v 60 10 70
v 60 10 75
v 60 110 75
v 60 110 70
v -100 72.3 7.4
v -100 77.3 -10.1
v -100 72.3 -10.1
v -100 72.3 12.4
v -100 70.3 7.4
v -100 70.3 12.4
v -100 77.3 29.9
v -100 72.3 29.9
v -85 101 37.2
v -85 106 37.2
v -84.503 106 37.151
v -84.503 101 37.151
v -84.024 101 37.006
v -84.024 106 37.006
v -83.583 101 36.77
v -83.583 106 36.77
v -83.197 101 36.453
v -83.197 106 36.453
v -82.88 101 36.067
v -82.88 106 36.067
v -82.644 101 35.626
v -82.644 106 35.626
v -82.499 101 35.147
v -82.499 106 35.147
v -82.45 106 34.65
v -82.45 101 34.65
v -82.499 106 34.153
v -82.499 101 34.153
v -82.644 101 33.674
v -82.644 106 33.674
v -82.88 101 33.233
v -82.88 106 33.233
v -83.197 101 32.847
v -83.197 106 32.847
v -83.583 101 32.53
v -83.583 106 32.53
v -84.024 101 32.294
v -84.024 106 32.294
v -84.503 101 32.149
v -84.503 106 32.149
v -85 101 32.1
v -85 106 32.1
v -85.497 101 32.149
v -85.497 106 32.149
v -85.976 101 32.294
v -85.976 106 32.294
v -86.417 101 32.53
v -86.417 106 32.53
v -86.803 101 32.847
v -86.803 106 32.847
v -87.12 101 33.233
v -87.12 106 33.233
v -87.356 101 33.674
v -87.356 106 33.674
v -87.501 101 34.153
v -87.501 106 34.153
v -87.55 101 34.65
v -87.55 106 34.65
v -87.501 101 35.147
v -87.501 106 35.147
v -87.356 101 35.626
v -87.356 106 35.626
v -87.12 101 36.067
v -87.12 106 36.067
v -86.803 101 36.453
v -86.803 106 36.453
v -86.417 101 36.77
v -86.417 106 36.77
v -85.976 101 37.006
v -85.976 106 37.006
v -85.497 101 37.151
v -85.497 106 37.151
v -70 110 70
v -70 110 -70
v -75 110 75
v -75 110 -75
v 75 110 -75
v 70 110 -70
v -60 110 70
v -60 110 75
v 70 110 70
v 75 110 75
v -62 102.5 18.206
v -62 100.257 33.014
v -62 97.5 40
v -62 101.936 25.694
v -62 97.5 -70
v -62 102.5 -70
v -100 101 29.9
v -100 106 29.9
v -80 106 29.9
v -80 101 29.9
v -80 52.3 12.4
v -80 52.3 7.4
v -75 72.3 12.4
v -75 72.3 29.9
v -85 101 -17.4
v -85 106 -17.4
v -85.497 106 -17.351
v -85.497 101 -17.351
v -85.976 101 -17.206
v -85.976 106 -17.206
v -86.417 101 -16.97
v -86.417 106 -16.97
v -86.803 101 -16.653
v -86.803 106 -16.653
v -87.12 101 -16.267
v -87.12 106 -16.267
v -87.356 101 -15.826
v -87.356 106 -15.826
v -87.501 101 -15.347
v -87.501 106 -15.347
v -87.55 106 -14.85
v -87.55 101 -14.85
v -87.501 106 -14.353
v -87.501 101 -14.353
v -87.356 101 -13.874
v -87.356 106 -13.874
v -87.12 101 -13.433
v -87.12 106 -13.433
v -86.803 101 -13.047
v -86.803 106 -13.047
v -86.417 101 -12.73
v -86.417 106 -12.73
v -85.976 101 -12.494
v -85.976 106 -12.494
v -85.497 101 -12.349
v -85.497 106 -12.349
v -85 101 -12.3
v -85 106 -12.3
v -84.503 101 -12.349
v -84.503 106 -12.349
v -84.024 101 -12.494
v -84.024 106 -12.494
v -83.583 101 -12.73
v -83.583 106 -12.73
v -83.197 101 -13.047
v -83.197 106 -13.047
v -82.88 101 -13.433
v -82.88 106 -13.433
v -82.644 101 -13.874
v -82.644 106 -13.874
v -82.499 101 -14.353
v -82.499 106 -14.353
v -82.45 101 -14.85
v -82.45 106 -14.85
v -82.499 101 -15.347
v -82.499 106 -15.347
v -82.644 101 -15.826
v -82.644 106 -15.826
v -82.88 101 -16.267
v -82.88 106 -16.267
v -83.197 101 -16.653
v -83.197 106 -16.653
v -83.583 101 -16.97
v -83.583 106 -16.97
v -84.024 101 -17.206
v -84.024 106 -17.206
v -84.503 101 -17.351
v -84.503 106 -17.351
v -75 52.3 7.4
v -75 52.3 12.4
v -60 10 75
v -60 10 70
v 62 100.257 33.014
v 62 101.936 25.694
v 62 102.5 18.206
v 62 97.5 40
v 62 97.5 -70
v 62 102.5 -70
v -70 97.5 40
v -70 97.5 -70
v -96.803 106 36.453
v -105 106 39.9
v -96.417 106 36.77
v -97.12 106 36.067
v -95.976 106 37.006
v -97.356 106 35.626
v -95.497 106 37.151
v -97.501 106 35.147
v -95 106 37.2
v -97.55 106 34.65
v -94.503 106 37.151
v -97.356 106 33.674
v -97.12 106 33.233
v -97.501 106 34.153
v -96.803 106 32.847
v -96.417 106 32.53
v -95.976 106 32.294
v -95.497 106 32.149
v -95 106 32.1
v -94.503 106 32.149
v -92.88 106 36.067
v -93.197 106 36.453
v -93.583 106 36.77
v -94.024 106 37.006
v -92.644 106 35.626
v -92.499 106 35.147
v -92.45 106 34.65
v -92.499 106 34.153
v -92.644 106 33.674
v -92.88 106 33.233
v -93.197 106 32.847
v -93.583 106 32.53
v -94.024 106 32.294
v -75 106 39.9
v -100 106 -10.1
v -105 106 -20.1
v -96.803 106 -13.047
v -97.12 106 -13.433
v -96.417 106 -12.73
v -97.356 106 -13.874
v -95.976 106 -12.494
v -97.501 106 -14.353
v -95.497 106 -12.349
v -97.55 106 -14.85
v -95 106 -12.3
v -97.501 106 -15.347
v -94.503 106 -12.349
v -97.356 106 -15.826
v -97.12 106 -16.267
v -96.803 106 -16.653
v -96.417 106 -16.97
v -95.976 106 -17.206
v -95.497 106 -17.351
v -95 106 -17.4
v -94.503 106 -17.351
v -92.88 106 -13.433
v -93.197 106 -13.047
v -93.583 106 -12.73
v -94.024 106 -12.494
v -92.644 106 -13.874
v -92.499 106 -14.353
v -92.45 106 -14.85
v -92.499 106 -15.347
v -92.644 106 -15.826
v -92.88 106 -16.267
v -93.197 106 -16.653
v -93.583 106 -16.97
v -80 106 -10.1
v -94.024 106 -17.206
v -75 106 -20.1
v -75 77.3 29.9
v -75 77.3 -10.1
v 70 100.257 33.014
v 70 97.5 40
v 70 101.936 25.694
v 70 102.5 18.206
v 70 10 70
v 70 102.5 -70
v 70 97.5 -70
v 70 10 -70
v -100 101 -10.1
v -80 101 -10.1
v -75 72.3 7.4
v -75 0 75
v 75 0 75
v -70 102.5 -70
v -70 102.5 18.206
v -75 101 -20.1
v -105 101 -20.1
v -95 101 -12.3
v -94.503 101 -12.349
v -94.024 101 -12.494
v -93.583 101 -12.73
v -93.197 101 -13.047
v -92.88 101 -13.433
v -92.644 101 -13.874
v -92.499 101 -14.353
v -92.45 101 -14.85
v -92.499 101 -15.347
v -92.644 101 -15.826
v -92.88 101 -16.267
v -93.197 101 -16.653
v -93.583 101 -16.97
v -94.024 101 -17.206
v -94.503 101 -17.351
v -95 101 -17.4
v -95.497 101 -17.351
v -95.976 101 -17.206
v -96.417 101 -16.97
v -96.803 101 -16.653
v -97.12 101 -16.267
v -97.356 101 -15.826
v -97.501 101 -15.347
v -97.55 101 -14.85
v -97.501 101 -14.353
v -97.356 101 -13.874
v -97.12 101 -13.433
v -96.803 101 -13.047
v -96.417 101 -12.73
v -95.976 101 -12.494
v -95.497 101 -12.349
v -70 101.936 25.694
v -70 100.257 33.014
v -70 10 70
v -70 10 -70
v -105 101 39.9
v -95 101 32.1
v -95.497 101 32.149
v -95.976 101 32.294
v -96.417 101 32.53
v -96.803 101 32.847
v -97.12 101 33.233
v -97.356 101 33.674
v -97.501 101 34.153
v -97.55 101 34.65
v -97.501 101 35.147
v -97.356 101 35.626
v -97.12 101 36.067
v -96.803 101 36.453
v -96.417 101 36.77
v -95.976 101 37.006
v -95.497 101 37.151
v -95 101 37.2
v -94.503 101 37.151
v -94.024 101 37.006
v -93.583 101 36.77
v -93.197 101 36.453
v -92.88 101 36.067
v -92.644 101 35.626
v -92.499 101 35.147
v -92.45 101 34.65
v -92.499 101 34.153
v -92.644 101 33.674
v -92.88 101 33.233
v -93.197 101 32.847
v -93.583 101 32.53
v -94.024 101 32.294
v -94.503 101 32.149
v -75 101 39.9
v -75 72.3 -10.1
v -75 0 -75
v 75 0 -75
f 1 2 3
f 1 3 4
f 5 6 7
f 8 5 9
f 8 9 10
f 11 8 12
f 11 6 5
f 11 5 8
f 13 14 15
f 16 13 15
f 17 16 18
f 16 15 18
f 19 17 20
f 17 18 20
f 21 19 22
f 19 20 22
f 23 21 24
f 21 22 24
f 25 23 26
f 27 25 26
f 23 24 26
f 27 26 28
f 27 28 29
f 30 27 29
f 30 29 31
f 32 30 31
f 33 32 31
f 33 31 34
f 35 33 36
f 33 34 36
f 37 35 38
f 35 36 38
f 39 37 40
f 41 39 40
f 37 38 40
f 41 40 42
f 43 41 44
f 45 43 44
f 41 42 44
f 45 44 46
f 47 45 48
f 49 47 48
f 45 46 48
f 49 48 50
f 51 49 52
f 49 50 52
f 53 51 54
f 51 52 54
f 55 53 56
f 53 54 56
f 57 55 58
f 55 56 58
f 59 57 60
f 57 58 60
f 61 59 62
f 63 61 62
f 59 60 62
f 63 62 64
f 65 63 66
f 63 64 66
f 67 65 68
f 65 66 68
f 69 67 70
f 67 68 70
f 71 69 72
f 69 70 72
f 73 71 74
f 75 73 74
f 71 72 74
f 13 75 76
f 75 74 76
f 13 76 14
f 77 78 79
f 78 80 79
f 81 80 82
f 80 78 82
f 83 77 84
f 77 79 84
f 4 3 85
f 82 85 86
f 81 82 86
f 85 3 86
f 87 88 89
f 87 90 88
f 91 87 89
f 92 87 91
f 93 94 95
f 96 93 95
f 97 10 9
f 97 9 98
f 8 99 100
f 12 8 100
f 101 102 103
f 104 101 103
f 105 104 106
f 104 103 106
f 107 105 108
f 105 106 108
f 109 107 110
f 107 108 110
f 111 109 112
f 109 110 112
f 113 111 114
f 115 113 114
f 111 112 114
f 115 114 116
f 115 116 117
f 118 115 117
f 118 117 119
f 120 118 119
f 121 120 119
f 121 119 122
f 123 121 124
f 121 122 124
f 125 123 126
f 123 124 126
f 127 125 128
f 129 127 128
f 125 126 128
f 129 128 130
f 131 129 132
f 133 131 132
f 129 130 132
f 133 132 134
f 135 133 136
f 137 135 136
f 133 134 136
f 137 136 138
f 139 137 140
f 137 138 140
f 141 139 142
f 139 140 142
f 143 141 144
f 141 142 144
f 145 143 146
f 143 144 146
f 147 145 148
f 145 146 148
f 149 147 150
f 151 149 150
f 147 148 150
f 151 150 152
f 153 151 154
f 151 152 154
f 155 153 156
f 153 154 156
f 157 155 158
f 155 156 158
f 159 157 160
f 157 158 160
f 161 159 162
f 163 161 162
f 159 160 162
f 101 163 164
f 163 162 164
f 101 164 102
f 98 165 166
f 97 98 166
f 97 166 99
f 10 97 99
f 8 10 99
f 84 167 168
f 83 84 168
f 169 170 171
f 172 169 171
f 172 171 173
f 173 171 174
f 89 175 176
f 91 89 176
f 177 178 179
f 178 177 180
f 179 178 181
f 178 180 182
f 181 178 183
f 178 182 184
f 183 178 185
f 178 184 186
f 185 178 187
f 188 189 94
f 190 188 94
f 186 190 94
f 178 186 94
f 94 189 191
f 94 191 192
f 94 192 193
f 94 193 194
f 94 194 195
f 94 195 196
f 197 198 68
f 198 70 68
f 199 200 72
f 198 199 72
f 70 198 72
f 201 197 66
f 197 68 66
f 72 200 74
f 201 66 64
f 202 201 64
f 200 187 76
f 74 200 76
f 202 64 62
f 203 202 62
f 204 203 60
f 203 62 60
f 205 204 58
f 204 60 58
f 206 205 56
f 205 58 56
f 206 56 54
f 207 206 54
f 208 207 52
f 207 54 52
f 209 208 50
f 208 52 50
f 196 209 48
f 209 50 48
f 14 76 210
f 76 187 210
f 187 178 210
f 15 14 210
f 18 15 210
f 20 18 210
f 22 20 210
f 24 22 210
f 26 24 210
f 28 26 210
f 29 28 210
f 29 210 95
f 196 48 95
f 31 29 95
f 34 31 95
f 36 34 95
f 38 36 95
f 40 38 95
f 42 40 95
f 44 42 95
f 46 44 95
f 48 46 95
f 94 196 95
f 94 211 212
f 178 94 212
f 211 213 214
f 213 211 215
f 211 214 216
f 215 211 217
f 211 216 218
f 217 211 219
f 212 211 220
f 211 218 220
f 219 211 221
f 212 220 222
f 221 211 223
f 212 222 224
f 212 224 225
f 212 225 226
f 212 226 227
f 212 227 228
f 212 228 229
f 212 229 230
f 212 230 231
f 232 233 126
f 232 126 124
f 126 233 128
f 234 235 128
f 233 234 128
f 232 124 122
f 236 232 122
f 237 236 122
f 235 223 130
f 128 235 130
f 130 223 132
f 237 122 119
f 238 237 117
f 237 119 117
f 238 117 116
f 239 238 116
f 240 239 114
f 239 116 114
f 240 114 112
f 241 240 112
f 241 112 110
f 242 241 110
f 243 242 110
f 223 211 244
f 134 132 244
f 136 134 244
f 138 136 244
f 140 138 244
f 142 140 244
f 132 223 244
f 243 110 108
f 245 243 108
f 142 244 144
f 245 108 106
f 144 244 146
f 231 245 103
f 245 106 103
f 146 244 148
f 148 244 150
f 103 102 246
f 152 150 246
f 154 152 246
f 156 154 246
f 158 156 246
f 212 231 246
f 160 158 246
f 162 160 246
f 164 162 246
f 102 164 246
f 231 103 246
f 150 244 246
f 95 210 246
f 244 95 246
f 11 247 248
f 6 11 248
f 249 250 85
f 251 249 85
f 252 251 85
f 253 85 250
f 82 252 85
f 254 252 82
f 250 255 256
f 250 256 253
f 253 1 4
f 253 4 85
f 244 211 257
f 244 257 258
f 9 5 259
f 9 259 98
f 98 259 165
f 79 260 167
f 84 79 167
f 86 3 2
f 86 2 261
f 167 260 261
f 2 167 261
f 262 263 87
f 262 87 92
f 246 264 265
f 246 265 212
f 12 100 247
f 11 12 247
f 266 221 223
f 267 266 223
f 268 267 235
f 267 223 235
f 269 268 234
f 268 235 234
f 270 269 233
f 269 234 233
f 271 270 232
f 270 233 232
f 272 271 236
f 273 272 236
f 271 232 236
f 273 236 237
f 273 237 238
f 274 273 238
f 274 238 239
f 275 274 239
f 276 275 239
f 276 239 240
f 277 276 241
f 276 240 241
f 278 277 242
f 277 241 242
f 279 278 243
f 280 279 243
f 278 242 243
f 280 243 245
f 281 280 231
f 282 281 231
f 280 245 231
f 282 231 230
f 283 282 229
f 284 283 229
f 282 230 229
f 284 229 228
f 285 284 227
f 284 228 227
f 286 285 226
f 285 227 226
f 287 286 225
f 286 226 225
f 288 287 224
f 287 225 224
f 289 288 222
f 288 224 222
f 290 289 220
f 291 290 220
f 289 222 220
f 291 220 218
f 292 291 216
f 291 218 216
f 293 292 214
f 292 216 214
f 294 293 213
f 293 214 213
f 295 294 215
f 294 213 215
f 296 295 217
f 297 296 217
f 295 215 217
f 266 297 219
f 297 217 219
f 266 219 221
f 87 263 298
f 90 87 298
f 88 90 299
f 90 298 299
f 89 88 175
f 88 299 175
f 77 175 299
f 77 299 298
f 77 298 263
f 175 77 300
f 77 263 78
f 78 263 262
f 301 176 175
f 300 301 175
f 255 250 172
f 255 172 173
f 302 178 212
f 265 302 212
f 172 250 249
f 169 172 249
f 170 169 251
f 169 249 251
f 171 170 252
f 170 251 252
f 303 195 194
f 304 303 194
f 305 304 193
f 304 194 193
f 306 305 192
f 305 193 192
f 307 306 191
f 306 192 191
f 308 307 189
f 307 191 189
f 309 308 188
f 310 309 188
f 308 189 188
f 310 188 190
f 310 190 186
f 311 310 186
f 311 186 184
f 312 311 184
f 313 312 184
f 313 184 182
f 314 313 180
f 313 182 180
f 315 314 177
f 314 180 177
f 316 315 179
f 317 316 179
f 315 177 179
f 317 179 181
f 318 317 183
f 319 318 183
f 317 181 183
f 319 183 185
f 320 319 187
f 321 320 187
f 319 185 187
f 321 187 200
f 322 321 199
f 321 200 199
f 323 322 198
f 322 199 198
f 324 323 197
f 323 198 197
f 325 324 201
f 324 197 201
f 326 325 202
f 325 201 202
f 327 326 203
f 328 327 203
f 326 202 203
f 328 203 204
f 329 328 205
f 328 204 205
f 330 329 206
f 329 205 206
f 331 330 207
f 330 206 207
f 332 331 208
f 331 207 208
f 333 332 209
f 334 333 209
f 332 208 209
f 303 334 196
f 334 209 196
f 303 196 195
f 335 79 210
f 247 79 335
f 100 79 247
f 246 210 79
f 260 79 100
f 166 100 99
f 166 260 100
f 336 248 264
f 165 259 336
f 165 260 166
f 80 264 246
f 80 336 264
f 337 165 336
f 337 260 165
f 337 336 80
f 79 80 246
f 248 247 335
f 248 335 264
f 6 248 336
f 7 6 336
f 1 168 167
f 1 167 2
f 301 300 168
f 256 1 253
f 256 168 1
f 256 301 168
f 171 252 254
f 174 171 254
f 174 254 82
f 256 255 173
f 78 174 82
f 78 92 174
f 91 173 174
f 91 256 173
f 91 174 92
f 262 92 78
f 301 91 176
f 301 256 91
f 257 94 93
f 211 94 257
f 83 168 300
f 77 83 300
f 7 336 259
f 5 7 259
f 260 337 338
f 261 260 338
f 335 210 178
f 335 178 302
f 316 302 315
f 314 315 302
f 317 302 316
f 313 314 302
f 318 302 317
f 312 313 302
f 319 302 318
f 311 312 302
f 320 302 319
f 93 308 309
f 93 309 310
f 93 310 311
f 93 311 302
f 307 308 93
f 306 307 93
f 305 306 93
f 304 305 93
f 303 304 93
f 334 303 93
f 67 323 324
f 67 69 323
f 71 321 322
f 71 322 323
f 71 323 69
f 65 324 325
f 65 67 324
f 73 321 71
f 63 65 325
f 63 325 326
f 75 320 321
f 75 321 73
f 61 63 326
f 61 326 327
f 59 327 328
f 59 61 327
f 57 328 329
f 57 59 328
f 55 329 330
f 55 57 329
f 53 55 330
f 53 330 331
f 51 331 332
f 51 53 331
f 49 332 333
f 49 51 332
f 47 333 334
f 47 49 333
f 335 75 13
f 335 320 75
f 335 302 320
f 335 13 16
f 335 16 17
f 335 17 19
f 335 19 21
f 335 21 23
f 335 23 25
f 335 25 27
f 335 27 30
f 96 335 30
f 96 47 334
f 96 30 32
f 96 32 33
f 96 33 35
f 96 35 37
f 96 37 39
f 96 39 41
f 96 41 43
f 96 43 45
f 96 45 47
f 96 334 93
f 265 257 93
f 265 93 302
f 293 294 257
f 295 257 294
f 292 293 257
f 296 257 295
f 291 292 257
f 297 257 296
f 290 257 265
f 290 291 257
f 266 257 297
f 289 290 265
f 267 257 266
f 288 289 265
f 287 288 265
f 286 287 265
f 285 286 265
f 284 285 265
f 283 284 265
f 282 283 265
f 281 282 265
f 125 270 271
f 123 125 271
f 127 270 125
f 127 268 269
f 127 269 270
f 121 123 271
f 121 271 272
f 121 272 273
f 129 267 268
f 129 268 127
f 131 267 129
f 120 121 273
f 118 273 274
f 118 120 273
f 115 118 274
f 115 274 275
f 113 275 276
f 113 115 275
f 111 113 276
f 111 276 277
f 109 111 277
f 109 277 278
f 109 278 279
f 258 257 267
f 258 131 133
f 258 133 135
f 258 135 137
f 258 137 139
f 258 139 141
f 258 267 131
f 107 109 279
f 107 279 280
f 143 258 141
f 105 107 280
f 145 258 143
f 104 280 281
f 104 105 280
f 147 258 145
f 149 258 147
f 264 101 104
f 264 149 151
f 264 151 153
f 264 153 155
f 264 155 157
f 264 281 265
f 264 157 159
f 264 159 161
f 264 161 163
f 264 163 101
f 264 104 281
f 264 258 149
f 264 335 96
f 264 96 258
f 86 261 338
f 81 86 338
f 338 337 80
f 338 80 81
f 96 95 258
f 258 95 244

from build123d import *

# Parameters (mm, degrees)
SKETCH1_W           = 150
SKETCH1_H           = 150
BOSS_EXTRUDE1_DEPTH = 10
BOSS_EXTRUDE2_DEPTH = 100
BOSS_EXTRUDE3_DEPTH = 30
SKETCH9_R           = 2.55
SKETCH9_W           = 20
SKETCH9_H           = 40
CUT_EXTRUDE1_DEPTH  = 5
BOSS_EXTRUDE4_DEPTH = 25
SKETCH12_W          = 110
SKETCH12_H          = 5
BOSS_EXTRUDE5_DEPTH = 8
FILLET2_R           = 50
CUT_EXTRUDE3_DEPTH  = 8
BOSS_EXTRUDE6_DEPTH = 18
SKETCH15_W          = 150
SKETCH15_H          = 150
BOSS_EXTRUDE7_DEPTH = 5
SKETCH16_W          = 150
SKETCH16_H          = 23
CUT_EXTRUDE4_DEPTH  = 75


with BuildPart() as part:
    # Sketch1 → Boss-Extrude1 (new body)
    with BuildSketch(Plane(origin=(0, 0, 0), x_dir=(1, 0, 0), z_dir=(0, 1, 0))):
        Rectangle(SKETCH1_W, SKETCH1_H)
    extrude(amount=BOSS_EXTRUDE1_DEPTH)

    # Sketch2 → Boss-Extrude2 (add)
    with BuildSketch(Plane(origin=(0, 10, 0), x_dir=(1, 0, 0), z_dir=(0, 1, 0))):
        Polygon((-75, 75), (75, 75), (75, -75), (60, -75), (60, -70), (70, -70), (70, 70), (-70, 70), (-70, -70), (-60, -70), (-60, -75), (-75, -75), align=None)
    extrude(amount=BOSS_EXTRUDE2_DEPTH)

    # Sketch8 → Boss-Extrude3 (add)
    with BuildSketch(Plane.ZY.offset(75)):
        Polygon((9.9, 106), (39.9, 106), (39.9, 101), (-20.1, 101), (-20.1, 106), align=None)
    extrude(amount=BOSS_EXTRUDE3_DEPTH)

    # Sketch9 → Cut-Extrude1 (cut)
    with BuildSketch(Plane(origin=(0, 106, 0), x_dir=(1, 0, 0), z_dir=(0, 1, 0))):
        with Locations(Location((-95, 14.85, 0), (0, 0, 270))):
            Circle(SKETCH9_R)
        with Locations(Location((-85, 14.85, 0), (0, 0, 90))):
            Circle(SKETCH9_R)
        with Locations(Location((-85, -34.65, 0), (0, 0, 270))):
            Circle(SKETCH9_R)
        with Locations(Location((-95, -34.65, 0), (0, 0, 90))):
            Circle(SKETCH9_R)
        with Locations((-90, -9.9)):
            Rectangle(SKETCH9_W, SKETCH9_H)
    extrude(amount=-CUT_EXTRUDE1_DEPTH, mode=Mode.SUBTRACT)

    # Sketch10 → Boss-Extrude4 (add)
    with BuildSketch(Plane.ZY.offset(75)):
        Polygon((-10.1, 77.3), (-10.1, 72.3), (7.4, 72.3), (7.4, 52.3), (12.4, 52.3), (12.4, 72.3), (29.9, 72.3), (29.9, 77.3), align=None)
    extrude(amount=BOSS_EXTRUDE4_DEPTH)

    # Sketch12 → Boss-Extrude5 (add)
    with BuildSketch(Plane(origin=(-70, 0, 0), x_dir=(0, 0, -1), z_dir=(1, 0, 0))):
        with Locations((15, 100)):
            Rectangle(SKETCH12_W, SKETCH12_H)
    boss_extrude5 = extrude(amount=BOSS_EXTRUDE5_DEPTH)

    # Mirror1: Boss-Extrude5 across plane
    add(boss_extrude5.mirror(Plane(origin=(0, 0, 0), x_dir=(0, 0, 1), z_dir=(1, 0, 0))))

    # Fillet2
    # the kernel refuses this fillet: 50 mm, written as the material it takes off along each edge
    with BuildSketch(Plane(origin=(70, 102.5, 40), x_dir=(0, -1, 0), z_dir=(-1, 0, 0))) as fillet2_piece_1:
        with BuildLine():
            CenterArc((50, -21.794494718), FILLET2_R, 154.158067237, 25.841932763)
            Line((0, -21.794494718), (0, 0))
            Line((0, 0), (5, 0))
        make_face()
    extrude(amount=62.486236794, mode=Mode.SUBTRACT)
    with BuildSketch(Plane(origin=(-70, 102.5, 40), x_dir=(0, 0, -1), z_dir=(1, 0, 0))) as fillet2_piece_2:
        with BuildLine():
            CenterArc((21.794494718, -50), FILLET2_R, 90, 25.841932763)
            Line((0, -5), (0, 0))
            Line((0, 0), (21.794494718, 0))
        make_face()
    extrude(amount=62.486236794, mode=Mode.SUBTRACT)

    # Sketch13 → Cut-Extrude3 (cut)
    with BuildSketch(Plane.XY.offset(12.4)):
        Polygon((-100, 52.3), (-100, 70.3), (-80, 52.3), align=None)
    extrude(amount=-CUT_EXTRUDE3_DEPTH, mode=Mode.SUBTRACT)

    # Sketch14 → Boss-Extrude6 (add)
    with BuildSketch(Plane(origin=(0, 110, 0), x_dir=(1, 0, 0), z_dir=(0, 1, 0))):
        Polygon((-75, -75), (-60, -75), (-60, -70), (-70, -70), (-70, -35), (-75, -35), align=None)
        Polygon((60, -75), (60, -70), (70, -70), (70, 70), (-70, 70), (-70, 65), (-75, 65), (-75, 75), (75, 75), (75, -75), align=None)
    extrude(amount=BOSS_EXTRUDE6_DEPTH)

    # Sketch15 → Boss-Extrude7 (add)
    with BuildSketch(Plane(origin=(0, 128, 0), x_dir=(1, 0, 0), z_dir=(0, 1, 0))):
        Rectangle(SKETCH15_W, SKETCH15_H)
    extrude(amount=BOSS_EXTRUDE7_DEPTH)

    # Sketch16 → Cut-Extrude4 (cut, symmetric)
    with BuildSketch(Plane.XY):
        with Locations((0, 121.5)):
            Rectangle(SKETCH16_W, SKETCH16_H)
    extrude(amount=CUT_EXTRUDE4_DEPTH, both=True, mode=Mode.SUBTRACT)


solid = part.part
